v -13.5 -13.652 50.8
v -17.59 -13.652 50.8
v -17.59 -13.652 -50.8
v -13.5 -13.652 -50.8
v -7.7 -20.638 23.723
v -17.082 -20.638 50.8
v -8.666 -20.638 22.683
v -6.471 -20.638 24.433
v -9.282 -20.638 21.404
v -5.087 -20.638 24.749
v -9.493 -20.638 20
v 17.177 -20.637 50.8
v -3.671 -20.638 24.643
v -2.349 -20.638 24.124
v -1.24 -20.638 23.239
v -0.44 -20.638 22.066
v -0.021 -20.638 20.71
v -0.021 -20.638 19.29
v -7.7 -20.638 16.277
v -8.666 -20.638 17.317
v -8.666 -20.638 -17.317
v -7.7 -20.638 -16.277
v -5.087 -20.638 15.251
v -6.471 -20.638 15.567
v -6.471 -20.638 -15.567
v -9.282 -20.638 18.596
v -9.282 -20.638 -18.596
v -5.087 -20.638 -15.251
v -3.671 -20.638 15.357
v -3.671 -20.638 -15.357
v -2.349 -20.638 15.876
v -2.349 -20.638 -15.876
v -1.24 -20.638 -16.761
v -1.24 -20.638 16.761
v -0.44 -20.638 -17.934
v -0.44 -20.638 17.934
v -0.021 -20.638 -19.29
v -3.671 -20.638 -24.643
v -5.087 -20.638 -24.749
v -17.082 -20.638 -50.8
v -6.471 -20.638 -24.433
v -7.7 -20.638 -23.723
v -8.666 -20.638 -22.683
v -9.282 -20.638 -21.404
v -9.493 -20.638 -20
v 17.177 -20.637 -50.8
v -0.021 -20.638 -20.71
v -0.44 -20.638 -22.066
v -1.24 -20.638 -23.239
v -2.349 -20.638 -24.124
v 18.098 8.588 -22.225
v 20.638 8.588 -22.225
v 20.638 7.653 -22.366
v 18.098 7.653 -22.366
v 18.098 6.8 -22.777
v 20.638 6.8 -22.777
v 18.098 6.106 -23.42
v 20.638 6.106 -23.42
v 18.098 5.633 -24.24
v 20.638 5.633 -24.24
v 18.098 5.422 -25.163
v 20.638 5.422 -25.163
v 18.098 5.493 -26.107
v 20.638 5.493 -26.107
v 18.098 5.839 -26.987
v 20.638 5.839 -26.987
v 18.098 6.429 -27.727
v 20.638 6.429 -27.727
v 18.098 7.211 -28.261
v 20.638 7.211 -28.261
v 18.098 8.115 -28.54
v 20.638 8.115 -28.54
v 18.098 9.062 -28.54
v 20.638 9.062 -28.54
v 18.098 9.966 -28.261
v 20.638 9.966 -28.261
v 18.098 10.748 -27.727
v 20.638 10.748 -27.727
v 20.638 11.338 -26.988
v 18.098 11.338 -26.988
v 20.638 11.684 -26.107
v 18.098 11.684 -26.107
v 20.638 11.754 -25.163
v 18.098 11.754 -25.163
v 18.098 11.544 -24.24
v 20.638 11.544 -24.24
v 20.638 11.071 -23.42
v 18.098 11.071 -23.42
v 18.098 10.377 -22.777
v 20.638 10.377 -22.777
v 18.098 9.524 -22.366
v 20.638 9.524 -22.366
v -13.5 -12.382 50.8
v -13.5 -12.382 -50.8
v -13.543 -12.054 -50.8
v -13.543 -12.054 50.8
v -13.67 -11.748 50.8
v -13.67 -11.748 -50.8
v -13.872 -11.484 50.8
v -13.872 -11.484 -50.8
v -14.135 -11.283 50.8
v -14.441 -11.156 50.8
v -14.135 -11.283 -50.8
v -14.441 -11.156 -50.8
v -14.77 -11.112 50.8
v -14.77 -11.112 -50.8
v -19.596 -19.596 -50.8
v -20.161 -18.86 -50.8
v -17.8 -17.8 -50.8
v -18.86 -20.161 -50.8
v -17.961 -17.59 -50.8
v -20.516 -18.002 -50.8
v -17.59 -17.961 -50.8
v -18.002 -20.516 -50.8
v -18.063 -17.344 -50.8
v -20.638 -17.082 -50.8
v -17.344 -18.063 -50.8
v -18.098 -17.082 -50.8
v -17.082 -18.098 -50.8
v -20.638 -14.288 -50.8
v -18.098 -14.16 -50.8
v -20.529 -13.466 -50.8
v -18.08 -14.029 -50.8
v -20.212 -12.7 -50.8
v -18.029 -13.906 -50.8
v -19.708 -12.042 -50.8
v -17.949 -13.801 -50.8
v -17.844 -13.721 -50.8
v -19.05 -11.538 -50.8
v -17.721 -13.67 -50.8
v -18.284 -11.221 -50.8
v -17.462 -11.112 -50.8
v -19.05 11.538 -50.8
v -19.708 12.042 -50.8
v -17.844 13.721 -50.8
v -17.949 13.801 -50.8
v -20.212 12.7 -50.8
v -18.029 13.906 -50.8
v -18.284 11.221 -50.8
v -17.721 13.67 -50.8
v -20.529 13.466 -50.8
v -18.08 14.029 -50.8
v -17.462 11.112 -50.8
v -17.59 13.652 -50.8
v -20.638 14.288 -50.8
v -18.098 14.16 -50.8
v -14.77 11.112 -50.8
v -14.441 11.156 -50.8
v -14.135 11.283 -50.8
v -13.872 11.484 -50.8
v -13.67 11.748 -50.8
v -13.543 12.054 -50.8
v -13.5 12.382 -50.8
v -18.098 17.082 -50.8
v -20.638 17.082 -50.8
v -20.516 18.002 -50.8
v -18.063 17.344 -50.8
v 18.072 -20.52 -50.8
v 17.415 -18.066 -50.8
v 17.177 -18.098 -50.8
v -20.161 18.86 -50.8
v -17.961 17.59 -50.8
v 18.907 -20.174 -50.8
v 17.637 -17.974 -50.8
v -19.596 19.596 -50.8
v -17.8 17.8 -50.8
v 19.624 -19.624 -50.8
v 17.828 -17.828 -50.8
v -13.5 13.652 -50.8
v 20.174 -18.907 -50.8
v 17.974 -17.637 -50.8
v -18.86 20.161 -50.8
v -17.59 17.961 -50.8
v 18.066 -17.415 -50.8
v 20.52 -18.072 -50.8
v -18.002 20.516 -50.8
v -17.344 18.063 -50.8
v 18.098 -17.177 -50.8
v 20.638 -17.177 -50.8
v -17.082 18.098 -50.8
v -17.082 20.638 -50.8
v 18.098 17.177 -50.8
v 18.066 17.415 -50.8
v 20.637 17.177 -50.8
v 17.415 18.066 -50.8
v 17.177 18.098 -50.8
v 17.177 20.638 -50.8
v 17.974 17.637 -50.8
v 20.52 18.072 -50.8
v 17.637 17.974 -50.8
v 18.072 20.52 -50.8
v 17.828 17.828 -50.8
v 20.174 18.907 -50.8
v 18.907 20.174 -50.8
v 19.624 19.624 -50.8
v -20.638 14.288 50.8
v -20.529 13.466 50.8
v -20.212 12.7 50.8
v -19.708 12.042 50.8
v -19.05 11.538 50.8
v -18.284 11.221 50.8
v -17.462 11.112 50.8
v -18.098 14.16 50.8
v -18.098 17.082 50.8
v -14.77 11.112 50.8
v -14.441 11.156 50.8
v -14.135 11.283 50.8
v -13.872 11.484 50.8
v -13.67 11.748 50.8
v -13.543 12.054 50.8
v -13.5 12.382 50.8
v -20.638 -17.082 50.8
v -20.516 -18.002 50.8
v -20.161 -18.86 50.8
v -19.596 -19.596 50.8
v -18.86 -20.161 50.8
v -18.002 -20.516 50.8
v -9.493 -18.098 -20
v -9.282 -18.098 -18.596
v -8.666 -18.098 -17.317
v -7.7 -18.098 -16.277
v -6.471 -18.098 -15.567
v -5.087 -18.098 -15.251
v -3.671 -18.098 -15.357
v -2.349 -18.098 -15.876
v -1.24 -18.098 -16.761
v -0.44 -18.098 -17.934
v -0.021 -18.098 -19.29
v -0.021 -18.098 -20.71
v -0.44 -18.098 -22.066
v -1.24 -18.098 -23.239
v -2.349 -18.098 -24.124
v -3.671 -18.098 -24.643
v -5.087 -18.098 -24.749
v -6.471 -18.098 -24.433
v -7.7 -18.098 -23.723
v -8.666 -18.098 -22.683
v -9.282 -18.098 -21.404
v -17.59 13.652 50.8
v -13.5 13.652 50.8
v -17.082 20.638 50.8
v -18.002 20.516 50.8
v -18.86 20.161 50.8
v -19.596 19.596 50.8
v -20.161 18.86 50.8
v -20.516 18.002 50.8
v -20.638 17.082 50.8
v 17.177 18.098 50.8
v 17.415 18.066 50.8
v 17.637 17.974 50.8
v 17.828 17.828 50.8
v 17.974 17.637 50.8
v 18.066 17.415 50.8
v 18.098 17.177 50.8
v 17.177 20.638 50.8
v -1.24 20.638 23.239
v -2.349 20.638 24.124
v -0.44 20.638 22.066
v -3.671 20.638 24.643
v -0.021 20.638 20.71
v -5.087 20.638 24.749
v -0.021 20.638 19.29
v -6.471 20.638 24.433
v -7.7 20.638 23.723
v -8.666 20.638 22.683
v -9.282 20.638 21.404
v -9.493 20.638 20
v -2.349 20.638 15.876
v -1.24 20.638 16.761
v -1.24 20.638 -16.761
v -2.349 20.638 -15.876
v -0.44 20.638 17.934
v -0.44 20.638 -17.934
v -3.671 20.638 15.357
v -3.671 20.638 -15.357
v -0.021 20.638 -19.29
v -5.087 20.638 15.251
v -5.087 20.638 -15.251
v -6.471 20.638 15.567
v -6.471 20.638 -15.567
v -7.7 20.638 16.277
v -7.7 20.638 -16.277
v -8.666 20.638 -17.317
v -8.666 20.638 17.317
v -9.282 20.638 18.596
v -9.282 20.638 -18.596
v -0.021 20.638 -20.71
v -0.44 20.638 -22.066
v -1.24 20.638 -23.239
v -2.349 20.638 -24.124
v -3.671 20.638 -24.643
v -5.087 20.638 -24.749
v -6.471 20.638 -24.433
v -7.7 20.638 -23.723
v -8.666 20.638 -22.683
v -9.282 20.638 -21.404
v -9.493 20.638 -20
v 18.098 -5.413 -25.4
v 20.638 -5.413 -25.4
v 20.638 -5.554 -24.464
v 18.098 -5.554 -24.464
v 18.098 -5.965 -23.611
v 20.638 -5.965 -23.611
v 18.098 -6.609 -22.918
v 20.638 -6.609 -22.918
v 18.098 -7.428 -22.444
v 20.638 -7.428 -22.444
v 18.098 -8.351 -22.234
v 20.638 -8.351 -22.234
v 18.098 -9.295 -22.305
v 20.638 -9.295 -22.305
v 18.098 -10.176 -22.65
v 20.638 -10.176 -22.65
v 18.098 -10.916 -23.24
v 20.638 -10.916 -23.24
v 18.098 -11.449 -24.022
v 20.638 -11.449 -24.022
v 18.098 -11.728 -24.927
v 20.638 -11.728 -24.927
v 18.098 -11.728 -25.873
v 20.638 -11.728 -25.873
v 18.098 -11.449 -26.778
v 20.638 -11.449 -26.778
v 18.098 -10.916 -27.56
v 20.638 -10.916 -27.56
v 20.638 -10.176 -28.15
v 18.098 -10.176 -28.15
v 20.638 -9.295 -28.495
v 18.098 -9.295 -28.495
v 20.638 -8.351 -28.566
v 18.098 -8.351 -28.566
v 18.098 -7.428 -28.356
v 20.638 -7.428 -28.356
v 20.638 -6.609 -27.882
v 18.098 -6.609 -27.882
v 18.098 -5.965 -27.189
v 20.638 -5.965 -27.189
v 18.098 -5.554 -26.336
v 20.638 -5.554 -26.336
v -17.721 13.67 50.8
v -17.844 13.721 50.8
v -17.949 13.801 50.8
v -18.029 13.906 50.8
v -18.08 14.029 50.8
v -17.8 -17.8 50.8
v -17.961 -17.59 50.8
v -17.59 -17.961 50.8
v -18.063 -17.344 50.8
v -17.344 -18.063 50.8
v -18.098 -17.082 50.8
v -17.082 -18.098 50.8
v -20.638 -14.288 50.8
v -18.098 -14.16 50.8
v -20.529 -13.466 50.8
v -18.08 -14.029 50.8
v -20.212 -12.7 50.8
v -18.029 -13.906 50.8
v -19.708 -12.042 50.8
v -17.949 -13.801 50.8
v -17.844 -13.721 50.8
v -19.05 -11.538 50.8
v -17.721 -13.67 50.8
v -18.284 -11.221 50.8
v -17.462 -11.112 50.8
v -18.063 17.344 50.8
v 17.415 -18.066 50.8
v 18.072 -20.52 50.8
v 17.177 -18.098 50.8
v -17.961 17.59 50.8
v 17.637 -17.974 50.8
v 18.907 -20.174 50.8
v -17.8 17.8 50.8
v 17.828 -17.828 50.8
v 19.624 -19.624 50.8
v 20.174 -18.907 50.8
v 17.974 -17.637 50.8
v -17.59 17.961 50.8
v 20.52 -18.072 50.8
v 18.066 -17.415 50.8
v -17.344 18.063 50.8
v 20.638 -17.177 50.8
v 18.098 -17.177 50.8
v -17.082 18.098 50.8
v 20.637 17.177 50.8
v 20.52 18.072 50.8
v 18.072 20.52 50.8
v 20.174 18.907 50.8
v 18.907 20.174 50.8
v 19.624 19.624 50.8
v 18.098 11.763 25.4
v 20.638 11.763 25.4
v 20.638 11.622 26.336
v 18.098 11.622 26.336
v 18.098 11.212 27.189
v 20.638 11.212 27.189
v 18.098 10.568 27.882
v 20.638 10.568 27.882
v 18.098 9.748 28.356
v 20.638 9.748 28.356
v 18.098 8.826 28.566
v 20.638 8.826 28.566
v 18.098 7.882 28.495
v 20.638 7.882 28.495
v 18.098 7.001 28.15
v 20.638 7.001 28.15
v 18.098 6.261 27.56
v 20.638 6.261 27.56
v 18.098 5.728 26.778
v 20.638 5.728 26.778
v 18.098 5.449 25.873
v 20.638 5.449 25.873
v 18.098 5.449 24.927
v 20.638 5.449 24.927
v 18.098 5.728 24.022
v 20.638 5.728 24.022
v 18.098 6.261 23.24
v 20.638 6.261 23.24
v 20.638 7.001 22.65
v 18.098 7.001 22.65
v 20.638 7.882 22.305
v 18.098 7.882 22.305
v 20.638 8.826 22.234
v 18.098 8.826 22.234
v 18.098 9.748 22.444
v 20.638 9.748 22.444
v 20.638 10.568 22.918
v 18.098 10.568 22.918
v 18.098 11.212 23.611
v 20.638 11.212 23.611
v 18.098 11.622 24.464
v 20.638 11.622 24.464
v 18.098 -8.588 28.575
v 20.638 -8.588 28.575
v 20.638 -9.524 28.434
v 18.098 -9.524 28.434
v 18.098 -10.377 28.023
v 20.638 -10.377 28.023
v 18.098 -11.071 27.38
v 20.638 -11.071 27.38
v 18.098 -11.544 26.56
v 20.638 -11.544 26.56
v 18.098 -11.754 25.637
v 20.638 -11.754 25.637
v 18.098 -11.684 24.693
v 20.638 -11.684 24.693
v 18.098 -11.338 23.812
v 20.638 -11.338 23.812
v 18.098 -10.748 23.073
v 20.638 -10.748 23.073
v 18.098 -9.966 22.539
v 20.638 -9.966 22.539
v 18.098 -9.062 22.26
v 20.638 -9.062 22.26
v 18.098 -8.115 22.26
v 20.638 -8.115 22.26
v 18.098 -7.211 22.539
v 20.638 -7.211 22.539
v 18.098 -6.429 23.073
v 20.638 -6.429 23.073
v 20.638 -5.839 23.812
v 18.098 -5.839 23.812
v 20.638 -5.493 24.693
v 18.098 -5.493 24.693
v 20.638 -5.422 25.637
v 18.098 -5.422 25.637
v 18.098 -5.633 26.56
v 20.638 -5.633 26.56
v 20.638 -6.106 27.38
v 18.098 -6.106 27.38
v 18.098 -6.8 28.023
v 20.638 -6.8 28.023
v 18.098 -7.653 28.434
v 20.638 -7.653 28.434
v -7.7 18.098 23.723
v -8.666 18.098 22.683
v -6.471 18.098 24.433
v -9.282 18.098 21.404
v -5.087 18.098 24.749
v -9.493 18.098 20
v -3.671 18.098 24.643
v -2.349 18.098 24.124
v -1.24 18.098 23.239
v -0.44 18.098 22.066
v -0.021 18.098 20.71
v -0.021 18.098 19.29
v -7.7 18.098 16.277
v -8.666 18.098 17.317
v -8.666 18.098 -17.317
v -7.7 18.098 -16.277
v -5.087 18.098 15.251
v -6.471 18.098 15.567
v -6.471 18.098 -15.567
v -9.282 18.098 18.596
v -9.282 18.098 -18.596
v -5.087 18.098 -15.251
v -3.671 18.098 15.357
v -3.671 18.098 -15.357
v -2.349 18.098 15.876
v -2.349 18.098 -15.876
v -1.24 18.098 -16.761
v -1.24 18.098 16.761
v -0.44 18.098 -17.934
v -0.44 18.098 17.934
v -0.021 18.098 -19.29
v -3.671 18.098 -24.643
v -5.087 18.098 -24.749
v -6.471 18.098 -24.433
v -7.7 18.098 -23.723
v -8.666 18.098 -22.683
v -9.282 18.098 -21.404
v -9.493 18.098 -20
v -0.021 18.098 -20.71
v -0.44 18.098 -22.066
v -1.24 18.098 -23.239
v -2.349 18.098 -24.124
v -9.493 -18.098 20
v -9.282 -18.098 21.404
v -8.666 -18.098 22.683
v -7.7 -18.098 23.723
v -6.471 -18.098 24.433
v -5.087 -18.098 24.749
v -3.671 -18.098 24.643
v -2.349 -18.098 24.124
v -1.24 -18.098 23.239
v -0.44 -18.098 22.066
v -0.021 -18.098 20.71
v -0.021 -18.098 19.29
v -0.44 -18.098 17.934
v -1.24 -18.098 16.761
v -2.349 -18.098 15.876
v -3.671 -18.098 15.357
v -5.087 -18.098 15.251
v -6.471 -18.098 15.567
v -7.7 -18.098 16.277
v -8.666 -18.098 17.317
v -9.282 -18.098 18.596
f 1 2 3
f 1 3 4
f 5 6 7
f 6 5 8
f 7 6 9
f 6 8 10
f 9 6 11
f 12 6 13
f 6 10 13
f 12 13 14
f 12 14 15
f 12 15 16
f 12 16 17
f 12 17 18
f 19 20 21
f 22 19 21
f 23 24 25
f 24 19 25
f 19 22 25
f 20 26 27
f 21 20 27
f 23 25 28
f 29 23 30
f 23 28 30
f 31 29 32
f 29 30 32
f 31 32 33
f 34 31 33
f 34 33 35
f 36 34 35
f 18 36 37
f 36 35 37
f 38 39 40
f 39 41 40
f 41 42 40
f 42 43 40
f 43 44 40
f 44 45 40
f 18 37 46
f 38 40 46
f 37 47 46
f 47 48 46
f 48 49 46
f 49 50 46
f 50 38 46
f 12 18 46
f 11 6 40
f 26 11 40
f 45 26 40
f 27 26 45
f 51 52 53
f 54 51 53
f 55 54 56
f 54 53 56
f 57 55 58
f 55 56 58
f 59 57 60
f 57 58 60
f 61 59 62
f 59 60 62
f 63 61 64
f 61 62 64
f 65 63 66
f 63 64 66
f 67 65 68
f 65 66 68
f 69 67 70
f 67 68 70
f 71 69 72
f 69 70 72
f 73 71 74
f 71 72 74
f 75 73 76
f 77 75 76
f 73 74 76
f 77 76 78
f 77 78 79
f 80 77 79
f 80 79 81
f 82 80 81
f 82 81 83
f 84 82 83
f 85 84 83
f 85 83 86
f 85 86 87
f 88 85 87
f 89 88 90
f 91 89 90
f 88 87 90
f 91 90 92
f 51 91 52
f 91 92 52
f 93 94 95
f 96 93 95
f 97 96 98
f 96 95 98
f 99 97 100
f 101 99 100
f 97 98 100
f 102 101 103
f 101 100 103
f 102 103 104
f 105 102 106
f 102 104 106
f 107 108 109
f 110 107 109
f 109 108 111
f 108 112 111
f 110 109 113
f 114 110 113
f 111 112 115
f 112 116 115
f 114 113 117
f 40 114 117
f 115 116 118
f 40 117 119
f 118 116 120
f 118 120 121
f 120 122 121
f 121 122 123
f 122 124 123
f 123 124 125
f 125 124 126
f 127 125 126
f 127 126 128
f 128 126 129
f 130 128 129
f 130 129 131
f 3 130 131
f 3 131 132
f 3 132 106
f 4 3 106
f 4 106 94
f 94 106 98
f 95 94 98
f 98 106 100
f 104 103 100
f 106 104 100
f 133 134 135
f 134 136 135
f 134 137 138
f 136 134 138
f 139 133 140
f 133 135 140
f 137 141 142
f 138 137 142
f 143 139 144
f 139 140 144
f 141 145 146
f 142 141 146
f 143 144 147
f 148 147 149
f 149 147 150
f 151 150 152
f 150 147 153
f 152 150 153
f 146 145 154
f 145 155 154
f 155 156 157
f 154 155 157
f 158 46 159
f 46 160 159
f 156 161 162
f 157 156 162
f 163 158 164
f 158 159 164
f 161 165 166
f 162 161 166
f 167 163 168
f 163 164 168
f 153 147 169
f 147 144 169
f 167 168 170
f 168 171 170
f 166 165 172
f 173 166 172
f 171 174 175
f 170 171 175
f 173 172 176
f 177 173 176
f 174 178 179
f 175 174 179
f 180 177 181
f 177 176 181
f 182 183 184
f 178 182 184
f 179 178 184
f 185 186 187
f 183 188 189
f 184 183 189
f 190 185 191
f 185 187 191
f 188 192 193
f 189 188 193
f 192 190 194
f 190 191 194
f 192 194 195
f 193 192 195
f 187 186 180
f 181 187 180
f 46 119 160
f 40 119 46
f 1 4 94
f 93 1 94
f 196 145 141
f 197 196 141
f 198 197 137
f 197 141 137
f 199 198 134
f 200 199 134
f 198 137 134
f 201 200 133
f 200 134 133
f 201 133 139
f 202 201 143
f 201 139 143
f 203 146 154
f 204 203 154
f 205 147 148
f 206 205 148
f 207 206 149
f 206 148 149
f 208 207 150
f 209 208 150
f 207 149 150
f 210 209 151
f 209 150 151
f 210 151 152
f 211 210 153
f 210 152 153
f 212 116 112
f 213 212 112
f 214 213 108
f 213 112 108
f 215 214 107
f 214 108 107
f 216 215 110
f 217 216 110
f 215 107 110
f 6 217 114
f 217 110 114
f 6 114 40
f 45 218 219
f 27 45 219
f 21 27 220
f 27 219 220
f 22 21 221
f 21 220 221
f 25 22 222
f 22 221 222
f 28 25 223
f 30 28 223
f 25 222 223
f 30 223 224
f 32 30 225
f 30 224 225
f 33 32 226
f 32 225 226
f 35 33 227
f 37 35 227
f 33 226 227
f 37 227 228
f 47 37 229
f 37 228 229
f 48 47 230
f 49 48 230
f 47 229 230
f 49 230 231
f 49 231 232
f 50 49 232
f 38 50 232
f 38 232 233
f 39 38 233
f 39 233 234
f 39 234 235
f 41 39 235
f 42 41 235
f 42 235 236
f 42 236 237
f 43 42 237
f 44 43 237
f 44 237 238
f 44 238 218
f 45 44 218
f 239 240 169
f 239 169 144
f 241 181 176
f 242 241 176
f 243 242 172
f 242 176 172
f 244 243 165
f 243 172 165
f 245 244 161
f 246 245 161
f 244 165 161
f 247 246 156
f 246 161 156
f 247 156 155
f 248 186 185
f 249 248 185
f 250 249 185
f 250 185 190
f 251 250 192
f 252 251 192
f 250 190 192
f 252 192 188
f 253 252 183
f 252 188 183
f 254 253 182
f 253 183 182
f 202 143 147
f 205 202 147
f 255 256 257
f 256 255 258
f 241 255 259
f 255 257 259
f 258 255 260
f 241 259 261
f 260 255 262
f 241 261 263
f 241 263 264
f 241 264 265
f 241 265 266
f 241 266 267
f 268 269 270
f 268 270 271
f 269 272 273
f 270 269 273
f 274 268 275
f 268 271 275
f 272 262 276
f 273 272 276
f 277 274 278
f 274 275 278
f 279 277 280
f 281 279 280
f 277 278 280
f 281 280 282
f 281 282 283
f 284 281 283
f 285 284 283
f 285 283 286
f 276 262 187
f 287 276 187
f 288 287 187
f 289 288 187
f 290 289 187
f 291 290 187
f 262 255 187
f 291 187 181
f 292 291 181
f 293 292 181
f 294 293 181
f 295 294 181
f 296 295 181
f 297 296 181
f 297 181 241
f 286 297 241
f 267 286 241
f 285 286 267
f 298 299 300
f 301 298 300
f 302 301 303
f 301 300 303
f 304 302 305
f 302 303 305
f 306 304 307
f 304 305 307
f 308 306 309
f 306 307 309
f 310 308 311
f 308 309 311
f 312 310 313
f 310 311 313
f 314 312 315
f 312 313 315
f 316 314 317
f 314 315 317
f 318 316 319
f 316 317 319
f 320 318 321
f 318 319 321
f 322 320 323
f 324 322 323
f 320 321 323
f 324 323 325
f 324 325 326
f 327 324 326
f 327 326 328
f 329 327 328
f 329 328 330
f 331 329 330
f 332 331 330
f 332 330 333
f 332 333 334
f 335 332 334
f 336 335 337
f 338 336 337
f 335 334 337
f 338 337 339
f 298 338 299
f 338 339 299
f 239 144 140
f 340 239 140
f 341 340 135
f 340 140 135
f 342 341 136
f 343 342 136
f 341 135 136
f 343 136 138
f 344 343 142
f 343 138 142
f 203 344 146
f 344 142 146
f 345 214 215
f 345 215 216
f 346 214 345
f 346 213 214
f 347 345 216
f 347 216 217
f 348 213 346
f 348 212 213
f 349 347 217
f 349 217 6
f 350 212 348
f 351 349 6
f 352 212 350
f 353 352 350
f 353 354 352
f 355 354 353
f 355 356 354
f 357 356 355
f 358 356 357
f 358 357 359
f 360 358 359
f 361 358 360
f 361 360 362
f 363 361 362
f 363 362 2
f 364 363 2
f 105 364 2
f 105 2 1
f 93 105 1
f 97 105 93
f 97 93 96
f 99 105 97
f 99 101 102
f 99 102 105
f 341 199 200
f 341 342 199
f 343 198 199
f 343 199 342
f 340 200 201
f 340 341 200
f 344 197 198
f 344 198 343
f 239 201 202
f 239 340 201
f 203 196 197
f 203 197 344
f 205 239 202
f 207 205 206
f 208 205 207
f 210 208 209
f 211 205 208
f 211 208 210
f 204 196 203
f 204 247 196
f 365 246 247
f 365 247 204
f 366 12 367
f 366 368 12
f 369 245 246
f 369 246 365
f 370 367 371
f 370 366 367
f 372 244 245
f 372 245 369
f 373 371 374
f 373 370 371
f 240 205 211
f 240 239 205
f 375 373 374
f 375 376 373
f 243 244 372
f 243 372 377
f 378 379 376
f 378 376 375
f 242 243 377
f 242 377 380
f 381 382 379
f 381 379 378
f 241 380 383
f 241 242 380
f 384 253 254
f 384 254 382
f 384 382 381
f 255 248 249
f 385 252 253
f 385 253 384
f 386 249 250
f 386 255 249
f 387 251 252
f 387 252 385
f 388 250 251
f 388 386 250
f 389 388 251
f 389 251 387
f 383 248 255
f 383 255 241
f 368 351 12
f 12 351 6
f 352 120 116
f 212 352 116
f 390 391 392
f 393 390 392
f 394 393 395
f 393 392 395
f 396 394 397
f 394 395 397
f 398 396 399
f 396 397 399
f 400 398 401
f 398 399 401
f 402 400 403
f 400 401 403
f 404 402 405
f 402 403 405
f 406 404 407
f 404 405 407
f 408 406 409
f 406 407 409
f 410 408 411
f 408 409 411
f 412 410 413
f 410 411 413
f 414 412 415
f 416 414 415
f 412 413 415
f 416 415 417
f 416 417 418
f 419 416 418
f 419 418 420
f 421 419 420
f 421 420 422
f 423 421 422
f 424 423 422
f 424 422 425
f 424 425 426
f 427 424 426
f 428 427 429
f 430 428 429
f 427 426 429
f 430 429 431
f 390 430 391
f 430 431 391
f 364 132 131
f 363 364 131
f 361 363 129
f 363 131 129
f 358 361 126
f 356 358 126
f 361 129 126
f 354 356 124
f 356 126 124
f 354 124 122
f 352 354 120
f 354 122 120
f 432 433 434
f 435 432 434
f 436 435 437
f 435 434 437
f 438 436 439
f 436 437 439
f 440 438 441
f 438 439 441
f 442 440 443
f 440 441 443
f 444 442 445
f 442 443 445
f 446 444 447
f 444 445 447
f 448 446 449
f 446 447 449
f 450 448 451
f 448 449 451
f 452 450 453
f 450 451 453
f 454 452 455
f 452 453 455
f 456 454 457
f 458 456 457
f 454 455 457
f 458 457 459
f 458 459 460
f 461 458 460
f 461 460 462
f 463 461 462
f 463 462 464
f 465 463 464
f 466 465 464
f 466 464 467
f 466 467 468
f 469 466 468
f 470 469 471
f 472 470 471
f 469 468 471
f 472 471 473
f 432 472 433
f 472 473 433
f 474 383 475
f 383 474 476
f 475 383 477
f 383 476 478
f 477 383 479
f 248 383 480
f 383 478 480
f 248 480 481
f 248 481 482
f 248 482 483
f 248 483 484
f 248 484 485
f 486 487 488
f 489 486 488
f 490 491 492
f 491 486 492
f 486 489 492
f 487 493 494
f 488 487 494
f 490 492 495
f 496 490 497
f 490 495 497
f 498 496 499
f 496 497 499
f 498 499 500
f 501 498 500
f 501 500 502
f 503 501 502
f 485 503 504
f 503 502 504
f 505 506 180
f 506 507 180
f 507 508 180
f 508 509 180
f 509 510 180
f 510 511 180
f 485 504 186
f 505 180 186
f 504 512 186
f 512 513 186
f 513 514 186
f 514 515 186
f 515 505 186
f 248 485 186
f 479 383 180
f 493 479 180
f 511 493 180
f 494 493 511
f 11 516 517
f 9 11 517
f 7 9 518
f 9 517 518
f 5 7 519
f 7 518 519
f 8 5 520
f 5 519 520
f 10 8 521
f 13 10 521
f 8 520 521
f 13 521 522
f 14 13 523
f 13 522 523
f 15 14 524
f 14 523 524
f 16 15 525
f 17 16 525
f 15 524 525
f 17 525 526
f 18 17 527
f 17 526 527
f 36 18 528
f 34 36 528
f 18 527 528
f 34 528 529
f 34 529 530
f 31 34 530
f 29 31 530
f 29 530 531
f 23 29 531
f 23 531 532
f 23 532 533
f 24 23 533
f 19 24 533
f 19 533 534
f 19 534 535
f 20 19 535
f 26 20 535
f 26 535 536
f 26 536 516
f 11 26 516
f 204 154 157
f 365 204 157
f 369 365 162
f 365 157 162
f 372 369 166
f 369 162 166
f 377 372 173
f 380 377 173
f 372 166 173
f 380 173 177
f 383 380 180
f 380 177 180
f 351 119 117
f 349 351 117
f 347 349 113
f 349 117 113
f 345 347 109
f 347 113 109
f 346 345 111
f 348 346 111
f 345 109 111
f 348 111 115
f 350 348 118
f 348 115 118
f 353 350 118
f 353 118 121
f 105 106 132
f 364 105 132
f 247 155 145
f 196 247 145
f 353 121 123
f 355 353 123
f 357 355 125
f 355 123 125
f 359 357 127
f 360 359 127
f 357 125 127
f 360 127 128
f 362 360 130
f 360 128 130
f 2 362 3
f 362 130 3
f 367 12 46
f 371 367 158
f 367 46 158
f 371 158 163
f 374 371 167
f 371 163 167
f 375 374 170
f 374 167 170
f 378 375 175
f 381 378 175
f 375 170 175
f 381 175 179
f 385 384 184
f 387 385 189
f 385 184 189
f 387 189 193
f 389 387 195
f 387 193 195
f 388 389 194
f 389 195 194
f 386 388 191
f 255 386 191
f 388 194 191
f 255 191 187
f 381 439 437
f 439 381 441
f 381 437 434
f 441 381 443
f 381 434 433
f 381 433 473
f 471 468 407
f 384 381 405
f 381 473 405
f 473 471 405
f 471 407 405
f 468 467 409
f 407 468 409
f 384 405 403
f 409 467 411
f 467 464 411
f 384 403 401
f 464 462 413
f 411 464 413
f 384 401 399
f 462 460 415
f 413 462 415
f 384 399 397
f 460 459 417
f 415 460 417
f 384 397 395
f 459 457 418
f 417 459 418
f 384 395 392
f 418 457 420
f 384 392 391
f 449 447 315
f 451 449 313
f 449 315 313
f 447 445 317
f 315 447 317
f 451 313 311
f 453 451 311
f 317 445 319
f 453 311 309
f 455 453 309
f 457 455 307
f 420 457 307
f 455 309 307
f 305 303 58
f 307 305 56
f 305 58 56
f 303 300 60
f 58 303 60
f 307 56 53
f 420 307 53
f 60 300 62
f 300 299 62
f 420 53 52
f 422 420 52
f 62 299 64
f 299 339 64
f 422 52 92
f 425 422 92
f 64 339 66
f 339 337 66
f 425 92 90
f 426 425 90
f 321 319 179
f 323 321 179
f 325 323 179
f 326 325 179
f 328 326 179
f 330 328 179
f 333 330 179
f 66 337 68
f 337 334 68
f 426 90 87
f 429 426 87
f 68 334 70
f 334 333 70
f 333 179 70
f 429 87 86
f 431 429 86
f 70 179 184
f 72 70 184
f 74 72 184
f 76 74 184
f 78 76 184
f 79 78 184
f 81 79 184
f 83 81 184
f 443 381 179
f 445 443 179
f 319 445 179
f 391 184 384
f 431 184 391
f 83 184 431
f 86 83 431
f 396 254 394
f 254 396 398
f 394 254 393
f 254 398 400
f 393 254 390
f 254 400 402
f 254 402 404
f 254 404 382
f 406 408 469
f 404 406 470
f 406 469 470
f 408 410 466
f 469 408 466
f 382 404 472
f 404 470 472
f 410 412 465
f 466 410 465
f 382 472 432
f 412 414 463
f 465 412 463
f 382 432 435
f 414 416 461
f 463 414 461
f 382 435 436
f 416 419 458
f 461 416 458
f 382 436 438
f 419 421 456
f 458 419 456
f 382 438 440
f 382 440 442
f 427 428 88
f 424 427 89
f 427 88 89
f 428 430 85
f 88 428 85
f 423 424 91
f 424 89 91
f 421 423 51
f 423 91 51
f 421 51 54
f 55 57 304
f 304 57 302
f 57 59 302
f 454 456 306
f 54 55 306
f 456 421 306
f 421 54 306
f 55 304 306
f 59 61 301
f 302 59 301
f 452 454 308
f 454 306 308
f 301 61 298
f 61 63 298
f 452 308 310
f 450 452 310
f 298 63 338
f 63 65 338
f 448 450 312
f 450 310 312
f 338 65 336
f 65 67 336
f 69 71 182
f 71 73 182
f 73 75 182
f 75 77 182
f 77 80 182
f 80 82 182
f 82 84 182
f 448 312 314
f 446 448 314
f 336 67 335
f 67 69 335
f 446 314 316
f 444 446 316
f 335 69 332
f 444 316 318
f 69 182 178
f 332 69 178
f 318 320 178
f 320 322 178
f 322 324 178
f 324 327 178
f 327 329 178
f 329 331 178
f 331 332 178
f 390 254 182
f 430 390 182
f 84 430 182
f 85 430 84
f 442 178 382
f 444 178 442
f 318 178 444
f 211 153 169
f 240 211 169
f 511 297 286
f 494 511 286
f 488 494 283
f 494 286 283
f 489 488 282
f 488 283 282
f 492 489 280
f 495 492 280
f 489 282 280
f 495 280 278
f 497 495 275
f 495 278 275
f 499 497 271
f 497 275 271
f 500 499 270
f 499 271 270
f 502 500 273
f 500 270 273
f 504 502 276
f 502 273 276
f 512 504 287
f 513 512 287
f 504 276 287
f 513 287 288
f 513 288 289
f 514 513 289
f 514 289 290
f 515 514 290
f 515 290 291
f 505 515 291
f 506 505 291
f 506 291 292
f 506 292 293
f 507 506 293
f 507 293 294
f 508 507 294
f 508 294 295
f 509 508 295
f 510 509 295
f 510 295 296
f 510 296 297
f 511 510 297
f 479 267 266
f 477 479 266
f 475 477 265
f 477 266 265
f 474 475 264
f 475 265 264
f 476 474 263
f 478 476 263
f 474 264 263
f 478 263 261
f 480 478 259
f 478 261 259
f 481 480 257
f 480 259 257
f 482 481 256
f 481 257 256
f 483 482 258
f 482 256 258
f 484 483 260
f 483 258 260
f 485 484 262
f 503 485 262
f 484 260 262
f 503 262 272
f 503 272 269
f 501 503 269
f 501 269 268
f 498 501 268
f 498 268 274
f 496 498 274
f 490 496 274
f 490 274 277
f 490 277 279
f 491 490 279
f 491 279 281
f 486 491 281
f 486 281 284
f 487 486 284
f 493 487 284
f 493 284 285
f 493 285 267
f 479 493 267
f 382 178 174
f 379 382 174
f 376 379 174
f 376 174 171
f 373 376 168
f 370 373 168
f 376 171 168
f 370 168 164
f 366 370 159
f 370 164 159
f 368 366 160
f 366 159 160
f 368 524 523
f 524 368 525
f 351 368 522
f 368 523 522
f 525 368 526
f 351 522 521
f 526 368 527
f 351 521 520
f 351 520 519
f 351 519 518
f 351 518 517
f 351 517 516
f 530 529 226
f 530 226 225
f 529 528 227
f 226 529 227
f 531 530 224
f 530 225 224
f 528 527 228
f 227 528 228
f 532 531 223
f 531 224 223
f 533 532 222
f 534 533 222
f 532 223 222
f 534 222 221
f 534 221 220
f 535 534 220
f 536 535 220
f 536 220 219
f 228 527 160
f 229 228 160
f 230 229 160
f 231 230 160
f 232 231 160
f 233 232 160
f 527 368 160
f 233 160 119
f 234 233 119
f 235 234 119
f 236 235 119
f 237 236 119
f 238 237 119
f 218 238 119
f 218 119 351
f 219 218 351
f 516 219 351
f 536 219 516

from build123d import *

# Parameters (mm, degrees)
BOSS_EXTRUDE1_DEPTH      = 50.8
BOSS_EXTRUDE1_DEPTH_BACK = 50.8
SKETCH7_R                = 4.7625
CUT_EXTRUDE1_DEPTH       = 45.72
SKETCH8_R                = 3.175
CUT_EXTRUDE2_DEPTH       = 2.54


with BuildPart() as part:
    # Sketch4 → Boss-Extrude1 (new, two sides: drawn at the far end of the back side and taken through both)
    with BuildSketch(Plane.XY.offset(-BOSS_EXTRUDE1_DEPTH_BACK)):
        with BuildLine():
            Line((-17.0815, -20.6375), (17.17675, -20.6375))
            ThreePointArc((17.17675, -20.6375), (19.623869793, -19.623869793), (20.6375, -17.17675))
            Line((20.6375, -17.17675), (20.6375, 17.17675))
            ThreePointArc((20.6375, 17.17675), (19.623869793, 19.623869793), (17.17675, 20.6375))
            Line((17.17675, 20.6375), (-17.0815, 20.6375))
            ThreePointArc((-17.0815, 20.6375), (-19.595971714, 19.595971714), (-20.6375, 17.0815))
            Line((-20.6375, 17.0815), (-20.6375, 14.2875))
            ThreePointArc((-20.6375, 14.2875), (-19.70756403, 12.04243597), (-17.4625, 11.1125))
            Line((-17.4625, 11.1125), (-14.7701, 11.1125))
            ThreePointArc((-14.7701, 11.1125), (-13.872074388, 11.484474388), (-13.5001, 12.3825))
            Line((-13.5001, 12.3825), (-13.5001, 13.6525))
            Line((-13.5001, 13.6525), (-17.5895, 13.6525))
            ThreePointArc((-17.5895, 13.6525), (-17.948710245, 13.801289755), (-18.0975, 14.1605))
            Line((-18.0975, 14.1605), (-18.0975, 17.0815))
            ThreePointArc((-18.0975, 17.0815), (-17.79992049, 17.79992049), (-17.0815, 18.0975))
            Line((-17.0815, 18.0975), (17.17675, 18.0975))
            ThreePointArc((17.17675, 18.0975), (17.827818569, 17.827818569), (18.0975, 17.17675))
            Line((18.0975, 17.17675), (18.0975, -17.17675))
            ThreePointArc((18.0975, -17.17675), (17.827818569, -17.827818569), (17.17675, -18.0975))
            Line((17.17675, -18.0975), (-17.0815, -18.0975))
            ThreePointArc((-17.0815, -18.0975), (-17.79992049, -17.79992049), (-18.0975, -17.0815))
            Line((-18.0975, -17.0815), (-18.0975, -14.1605))
            ThreePointArc((-18.0975, -14.1605), (-17.948710245, -13.801289755), (-17.5895, -13.6525))
            Line((-17.5895, -13.6525), (-13.5001, -13.6525))
            Line((-13.5001, -13.6525), (-13.5001, -12.3825))
            ThreePointArc((-13.5001, -12.3825), (-13.872074388, -11.484474388), (-14.7701, -11.1125))
            Line((-14.7701, -11.1125), (-17.4625, -11.1125))
            ThreePointArc((-17.4625, -11.1125), (-19.70756403, -12.04243597), (-20.6375, -14.2875))
            Line((-20.6375, -14.2875), (-20.6375, -17.0815))
            ThreePointArc((-20.6375, -17.0815), (-19.595971714, -19.595971714), (-17.0815, -20.6375))
        make_face()
    extrude(amount=BOSS_EXTRUDE1_DEPTH + BOSS_EXTRUDE1_DEPTH_BACK)

    # Sketch7 → Cut-Extrude1 (cut)
    with BuildSketch(Plane(origin=(0, 20.6375, 0), x_dir=(1, 0, 0), z_dir=(0, 1, 0))):
        with Locations(Location((-4.73075, -20, 0), (0, 0, 180))):
            Circle(SKETCH7_R)
        with Locations(Location((-4.73075, 20, 0), (0, 0, 180))):
            Circle(SKETCH7_R)
    extrude(amount=-CUT_EXTRUDE1_DEPTH, mode=Mode.SUBTRACT)

    # Sketch8 → Cut-Extrude2 (cut)
    with BuildSketch(Plane(origin=(20.6375, 0, 0), x_dir=(0, 0, -1), z_dir=(1, 0, 0))):
        with Locations(Location((25.4, -8.588375, 0), (0, 0, 90))):
            Circle(SKETCH8_R)
        with Locations(Location((25.4, 8.588375, 0), (0, 0, 180))):
            Circle(SKETCH8_R)
        with Locations(Location((-25.4, -8.588375, 0), (0, 0, 180))):
            Circle(SKETCH8_R)
        with Locations(Location((-25.4, 8.588375, 0), (0, 0, 90))):
            Circle(SKETCH8_R)
    extrude(amount=-CUT_EXTRUDE2_DEPTH, mode=Mode.SUBTRACT)


solid = part.part
